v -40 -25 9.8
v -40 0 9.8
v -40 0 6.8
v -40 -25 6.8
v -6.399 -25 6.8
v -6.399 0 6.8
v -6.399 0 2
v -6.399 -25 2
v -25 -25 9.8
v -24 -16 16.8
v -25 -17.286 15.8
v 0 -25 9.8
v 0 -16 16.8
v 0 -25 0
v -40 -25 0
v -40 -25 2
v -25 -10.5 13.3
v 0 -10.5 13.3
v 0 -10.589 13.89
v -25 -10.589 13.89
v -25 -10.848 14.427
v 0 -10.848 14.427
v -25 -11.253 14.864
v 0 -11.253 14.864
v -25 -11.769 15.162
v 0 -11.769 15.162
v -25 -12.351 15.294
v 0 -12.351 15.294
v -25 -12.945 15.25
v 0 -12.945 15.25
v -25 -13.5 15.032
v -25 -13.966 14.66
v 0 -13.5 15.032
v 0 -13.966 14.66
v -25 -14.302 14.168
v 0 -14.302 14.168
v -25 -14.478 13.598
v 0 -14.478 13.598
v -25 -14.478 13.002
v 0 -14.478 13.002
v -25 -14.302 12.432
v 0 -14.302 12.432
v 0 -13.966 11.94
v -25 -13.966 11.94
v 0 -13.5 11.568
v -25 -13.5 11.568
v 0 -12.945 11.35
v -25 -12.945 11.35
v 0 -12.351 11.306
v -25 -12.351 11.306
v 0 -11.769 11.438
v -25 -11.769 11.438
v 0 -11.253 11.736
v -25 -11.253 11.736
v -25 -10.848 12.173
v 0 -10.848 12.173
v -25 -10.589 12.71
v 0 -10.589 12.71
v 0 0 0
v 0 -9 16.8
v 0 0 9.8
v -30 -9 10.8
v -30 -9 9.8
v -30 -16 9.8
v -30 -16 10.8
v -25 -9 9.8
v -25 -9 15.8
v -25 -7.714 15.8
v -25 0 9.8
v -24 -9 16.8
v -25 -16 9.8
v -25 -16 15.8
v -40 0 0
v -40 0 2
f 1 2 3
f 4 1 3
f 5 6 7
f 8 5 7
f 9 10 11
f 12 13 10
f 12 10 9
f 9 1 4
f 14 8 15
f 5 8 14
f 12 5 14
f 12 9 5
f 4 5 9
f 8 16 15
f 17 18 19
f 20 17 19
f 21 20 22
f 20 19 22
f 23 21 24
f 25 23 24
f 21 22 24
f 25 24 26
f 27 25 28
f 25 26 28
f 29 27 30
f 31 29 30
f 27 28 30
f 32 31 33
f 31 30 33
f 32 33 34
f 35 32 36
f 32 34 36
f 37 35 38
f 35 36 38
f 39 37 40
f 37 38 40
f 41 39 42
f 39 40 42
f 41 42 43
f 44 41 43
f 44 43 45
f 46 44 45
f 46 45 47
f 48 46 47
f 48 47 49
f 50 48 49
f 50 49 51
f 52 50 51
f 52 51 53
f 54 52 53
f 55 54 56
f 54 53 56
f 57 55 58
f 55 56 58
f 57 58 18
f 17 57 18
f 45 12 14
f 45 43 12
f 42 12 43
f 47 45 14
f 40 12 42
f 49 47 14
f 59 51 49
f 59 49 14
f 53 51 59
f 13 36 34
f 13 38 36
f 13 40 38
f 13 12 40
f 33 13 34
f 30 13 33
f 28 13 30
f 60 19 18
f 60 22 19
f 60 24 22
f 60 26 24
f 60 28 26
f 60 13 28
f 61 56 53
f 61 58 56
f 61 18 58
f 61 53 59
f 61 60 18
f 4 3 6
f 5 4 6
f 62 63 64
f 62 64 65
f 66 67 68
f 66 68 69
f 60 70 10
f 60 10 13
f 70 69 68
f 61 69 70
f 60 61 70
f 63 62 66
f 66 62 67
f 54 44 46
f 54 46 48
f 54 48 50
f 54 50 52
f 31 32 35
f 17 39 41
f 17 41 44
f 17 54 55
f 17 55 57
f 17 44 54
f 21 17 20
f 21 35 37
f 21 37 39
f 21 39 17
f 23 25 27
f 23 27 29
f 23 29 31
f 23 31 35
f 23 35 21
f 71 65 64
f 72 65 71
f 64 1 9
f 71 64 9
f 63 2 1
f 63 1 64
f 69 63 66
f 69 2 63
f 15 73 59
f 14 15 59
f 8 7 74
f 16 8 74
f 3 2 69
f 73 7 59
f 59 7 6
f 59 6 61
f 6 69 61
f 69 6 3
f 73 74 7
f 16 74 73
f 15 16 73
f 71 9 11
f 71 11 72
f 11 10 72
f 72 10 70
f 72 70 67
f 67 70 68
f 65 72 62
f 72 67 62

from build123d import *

# Parameters (mm, degrees)
F0_W        = 30
F0_H        = 7
F1_DEPTH    = 25
F2_W        = 30
F2_H        = 9
F3_DEPTH    = 7
F4_R        = 2
F5_DEPTH    = 25
F7_DEPTH    = 25
F8_T1_DEPTH = 37.8601958556


# Not quite as in the source:
# - a fillet or chamfer that OpenCascade refuses, or shapes differently, is made with other operations: its cross-section is extruded or revolved along the edge and cut away or added


with BuildPart() as f1:
    # F0 (on Front) → F1 (new body)
    with BuildSketch(Plane.XZ):
        Polygon((-40, 0), (0, 0), (0, 9.8), (-30, 9.8), (-40, 9.8), (-40, 6.8), (-6.3993203272, 6.8), (-6.3993203272, 2), (-40, 2), align=None)
        with Locations((-15, 13.3)):
            Rectangle(F0_W, F0_H)
    extrude(amount=F1_DEPTH)

    # F2 (on face) → F3 (cut)
    with BuildSketch(Plane.XY.offset(16.8)):
        with Locations((-15, -4.5)):
            Rectangle(F2_W, F2_H)
        with Locations((-15, -20.5)):
            Rectangle(F2_W, F2_H)
    extrude(amount=-F3_DEPTH, mode=Mode.SUBTRACT)

    # F4 (on face) → F5 (cut)
    with BuildSketch(Plane.YZ):
        with Locations((-12.5, 13.3)):
            Circle(F4_R)
    extrude(amount=-F5_DEPTH, mode=Mode.SUBTRACT)

    # F6 (on face) → F7 (join)
    with BuildSketch(Plane.YZ):
        Polygon((-16, 16.8), (-25, 9.8), (-16, 9.8), align=None)
        Polygon((0, 9.8), (-9, 16.8), (-9, 9.8), align=None)
    extrude(amount=-F7_DEPTH)

    # F8: chamfer of 6 on 1 edges, made by hand

    # F8_s2 → F8_t1 (cut)
    with BuildSketch(Plane.XZ.offset(-6.4300979278)):
        Polygon((-24, 16.8), (-30, 10.8), (-30, 16.8), align=None)
    extrude(amount=F8_T1_DEPTH, mode=Mode.SUBTRACT)


solid = f1.part
